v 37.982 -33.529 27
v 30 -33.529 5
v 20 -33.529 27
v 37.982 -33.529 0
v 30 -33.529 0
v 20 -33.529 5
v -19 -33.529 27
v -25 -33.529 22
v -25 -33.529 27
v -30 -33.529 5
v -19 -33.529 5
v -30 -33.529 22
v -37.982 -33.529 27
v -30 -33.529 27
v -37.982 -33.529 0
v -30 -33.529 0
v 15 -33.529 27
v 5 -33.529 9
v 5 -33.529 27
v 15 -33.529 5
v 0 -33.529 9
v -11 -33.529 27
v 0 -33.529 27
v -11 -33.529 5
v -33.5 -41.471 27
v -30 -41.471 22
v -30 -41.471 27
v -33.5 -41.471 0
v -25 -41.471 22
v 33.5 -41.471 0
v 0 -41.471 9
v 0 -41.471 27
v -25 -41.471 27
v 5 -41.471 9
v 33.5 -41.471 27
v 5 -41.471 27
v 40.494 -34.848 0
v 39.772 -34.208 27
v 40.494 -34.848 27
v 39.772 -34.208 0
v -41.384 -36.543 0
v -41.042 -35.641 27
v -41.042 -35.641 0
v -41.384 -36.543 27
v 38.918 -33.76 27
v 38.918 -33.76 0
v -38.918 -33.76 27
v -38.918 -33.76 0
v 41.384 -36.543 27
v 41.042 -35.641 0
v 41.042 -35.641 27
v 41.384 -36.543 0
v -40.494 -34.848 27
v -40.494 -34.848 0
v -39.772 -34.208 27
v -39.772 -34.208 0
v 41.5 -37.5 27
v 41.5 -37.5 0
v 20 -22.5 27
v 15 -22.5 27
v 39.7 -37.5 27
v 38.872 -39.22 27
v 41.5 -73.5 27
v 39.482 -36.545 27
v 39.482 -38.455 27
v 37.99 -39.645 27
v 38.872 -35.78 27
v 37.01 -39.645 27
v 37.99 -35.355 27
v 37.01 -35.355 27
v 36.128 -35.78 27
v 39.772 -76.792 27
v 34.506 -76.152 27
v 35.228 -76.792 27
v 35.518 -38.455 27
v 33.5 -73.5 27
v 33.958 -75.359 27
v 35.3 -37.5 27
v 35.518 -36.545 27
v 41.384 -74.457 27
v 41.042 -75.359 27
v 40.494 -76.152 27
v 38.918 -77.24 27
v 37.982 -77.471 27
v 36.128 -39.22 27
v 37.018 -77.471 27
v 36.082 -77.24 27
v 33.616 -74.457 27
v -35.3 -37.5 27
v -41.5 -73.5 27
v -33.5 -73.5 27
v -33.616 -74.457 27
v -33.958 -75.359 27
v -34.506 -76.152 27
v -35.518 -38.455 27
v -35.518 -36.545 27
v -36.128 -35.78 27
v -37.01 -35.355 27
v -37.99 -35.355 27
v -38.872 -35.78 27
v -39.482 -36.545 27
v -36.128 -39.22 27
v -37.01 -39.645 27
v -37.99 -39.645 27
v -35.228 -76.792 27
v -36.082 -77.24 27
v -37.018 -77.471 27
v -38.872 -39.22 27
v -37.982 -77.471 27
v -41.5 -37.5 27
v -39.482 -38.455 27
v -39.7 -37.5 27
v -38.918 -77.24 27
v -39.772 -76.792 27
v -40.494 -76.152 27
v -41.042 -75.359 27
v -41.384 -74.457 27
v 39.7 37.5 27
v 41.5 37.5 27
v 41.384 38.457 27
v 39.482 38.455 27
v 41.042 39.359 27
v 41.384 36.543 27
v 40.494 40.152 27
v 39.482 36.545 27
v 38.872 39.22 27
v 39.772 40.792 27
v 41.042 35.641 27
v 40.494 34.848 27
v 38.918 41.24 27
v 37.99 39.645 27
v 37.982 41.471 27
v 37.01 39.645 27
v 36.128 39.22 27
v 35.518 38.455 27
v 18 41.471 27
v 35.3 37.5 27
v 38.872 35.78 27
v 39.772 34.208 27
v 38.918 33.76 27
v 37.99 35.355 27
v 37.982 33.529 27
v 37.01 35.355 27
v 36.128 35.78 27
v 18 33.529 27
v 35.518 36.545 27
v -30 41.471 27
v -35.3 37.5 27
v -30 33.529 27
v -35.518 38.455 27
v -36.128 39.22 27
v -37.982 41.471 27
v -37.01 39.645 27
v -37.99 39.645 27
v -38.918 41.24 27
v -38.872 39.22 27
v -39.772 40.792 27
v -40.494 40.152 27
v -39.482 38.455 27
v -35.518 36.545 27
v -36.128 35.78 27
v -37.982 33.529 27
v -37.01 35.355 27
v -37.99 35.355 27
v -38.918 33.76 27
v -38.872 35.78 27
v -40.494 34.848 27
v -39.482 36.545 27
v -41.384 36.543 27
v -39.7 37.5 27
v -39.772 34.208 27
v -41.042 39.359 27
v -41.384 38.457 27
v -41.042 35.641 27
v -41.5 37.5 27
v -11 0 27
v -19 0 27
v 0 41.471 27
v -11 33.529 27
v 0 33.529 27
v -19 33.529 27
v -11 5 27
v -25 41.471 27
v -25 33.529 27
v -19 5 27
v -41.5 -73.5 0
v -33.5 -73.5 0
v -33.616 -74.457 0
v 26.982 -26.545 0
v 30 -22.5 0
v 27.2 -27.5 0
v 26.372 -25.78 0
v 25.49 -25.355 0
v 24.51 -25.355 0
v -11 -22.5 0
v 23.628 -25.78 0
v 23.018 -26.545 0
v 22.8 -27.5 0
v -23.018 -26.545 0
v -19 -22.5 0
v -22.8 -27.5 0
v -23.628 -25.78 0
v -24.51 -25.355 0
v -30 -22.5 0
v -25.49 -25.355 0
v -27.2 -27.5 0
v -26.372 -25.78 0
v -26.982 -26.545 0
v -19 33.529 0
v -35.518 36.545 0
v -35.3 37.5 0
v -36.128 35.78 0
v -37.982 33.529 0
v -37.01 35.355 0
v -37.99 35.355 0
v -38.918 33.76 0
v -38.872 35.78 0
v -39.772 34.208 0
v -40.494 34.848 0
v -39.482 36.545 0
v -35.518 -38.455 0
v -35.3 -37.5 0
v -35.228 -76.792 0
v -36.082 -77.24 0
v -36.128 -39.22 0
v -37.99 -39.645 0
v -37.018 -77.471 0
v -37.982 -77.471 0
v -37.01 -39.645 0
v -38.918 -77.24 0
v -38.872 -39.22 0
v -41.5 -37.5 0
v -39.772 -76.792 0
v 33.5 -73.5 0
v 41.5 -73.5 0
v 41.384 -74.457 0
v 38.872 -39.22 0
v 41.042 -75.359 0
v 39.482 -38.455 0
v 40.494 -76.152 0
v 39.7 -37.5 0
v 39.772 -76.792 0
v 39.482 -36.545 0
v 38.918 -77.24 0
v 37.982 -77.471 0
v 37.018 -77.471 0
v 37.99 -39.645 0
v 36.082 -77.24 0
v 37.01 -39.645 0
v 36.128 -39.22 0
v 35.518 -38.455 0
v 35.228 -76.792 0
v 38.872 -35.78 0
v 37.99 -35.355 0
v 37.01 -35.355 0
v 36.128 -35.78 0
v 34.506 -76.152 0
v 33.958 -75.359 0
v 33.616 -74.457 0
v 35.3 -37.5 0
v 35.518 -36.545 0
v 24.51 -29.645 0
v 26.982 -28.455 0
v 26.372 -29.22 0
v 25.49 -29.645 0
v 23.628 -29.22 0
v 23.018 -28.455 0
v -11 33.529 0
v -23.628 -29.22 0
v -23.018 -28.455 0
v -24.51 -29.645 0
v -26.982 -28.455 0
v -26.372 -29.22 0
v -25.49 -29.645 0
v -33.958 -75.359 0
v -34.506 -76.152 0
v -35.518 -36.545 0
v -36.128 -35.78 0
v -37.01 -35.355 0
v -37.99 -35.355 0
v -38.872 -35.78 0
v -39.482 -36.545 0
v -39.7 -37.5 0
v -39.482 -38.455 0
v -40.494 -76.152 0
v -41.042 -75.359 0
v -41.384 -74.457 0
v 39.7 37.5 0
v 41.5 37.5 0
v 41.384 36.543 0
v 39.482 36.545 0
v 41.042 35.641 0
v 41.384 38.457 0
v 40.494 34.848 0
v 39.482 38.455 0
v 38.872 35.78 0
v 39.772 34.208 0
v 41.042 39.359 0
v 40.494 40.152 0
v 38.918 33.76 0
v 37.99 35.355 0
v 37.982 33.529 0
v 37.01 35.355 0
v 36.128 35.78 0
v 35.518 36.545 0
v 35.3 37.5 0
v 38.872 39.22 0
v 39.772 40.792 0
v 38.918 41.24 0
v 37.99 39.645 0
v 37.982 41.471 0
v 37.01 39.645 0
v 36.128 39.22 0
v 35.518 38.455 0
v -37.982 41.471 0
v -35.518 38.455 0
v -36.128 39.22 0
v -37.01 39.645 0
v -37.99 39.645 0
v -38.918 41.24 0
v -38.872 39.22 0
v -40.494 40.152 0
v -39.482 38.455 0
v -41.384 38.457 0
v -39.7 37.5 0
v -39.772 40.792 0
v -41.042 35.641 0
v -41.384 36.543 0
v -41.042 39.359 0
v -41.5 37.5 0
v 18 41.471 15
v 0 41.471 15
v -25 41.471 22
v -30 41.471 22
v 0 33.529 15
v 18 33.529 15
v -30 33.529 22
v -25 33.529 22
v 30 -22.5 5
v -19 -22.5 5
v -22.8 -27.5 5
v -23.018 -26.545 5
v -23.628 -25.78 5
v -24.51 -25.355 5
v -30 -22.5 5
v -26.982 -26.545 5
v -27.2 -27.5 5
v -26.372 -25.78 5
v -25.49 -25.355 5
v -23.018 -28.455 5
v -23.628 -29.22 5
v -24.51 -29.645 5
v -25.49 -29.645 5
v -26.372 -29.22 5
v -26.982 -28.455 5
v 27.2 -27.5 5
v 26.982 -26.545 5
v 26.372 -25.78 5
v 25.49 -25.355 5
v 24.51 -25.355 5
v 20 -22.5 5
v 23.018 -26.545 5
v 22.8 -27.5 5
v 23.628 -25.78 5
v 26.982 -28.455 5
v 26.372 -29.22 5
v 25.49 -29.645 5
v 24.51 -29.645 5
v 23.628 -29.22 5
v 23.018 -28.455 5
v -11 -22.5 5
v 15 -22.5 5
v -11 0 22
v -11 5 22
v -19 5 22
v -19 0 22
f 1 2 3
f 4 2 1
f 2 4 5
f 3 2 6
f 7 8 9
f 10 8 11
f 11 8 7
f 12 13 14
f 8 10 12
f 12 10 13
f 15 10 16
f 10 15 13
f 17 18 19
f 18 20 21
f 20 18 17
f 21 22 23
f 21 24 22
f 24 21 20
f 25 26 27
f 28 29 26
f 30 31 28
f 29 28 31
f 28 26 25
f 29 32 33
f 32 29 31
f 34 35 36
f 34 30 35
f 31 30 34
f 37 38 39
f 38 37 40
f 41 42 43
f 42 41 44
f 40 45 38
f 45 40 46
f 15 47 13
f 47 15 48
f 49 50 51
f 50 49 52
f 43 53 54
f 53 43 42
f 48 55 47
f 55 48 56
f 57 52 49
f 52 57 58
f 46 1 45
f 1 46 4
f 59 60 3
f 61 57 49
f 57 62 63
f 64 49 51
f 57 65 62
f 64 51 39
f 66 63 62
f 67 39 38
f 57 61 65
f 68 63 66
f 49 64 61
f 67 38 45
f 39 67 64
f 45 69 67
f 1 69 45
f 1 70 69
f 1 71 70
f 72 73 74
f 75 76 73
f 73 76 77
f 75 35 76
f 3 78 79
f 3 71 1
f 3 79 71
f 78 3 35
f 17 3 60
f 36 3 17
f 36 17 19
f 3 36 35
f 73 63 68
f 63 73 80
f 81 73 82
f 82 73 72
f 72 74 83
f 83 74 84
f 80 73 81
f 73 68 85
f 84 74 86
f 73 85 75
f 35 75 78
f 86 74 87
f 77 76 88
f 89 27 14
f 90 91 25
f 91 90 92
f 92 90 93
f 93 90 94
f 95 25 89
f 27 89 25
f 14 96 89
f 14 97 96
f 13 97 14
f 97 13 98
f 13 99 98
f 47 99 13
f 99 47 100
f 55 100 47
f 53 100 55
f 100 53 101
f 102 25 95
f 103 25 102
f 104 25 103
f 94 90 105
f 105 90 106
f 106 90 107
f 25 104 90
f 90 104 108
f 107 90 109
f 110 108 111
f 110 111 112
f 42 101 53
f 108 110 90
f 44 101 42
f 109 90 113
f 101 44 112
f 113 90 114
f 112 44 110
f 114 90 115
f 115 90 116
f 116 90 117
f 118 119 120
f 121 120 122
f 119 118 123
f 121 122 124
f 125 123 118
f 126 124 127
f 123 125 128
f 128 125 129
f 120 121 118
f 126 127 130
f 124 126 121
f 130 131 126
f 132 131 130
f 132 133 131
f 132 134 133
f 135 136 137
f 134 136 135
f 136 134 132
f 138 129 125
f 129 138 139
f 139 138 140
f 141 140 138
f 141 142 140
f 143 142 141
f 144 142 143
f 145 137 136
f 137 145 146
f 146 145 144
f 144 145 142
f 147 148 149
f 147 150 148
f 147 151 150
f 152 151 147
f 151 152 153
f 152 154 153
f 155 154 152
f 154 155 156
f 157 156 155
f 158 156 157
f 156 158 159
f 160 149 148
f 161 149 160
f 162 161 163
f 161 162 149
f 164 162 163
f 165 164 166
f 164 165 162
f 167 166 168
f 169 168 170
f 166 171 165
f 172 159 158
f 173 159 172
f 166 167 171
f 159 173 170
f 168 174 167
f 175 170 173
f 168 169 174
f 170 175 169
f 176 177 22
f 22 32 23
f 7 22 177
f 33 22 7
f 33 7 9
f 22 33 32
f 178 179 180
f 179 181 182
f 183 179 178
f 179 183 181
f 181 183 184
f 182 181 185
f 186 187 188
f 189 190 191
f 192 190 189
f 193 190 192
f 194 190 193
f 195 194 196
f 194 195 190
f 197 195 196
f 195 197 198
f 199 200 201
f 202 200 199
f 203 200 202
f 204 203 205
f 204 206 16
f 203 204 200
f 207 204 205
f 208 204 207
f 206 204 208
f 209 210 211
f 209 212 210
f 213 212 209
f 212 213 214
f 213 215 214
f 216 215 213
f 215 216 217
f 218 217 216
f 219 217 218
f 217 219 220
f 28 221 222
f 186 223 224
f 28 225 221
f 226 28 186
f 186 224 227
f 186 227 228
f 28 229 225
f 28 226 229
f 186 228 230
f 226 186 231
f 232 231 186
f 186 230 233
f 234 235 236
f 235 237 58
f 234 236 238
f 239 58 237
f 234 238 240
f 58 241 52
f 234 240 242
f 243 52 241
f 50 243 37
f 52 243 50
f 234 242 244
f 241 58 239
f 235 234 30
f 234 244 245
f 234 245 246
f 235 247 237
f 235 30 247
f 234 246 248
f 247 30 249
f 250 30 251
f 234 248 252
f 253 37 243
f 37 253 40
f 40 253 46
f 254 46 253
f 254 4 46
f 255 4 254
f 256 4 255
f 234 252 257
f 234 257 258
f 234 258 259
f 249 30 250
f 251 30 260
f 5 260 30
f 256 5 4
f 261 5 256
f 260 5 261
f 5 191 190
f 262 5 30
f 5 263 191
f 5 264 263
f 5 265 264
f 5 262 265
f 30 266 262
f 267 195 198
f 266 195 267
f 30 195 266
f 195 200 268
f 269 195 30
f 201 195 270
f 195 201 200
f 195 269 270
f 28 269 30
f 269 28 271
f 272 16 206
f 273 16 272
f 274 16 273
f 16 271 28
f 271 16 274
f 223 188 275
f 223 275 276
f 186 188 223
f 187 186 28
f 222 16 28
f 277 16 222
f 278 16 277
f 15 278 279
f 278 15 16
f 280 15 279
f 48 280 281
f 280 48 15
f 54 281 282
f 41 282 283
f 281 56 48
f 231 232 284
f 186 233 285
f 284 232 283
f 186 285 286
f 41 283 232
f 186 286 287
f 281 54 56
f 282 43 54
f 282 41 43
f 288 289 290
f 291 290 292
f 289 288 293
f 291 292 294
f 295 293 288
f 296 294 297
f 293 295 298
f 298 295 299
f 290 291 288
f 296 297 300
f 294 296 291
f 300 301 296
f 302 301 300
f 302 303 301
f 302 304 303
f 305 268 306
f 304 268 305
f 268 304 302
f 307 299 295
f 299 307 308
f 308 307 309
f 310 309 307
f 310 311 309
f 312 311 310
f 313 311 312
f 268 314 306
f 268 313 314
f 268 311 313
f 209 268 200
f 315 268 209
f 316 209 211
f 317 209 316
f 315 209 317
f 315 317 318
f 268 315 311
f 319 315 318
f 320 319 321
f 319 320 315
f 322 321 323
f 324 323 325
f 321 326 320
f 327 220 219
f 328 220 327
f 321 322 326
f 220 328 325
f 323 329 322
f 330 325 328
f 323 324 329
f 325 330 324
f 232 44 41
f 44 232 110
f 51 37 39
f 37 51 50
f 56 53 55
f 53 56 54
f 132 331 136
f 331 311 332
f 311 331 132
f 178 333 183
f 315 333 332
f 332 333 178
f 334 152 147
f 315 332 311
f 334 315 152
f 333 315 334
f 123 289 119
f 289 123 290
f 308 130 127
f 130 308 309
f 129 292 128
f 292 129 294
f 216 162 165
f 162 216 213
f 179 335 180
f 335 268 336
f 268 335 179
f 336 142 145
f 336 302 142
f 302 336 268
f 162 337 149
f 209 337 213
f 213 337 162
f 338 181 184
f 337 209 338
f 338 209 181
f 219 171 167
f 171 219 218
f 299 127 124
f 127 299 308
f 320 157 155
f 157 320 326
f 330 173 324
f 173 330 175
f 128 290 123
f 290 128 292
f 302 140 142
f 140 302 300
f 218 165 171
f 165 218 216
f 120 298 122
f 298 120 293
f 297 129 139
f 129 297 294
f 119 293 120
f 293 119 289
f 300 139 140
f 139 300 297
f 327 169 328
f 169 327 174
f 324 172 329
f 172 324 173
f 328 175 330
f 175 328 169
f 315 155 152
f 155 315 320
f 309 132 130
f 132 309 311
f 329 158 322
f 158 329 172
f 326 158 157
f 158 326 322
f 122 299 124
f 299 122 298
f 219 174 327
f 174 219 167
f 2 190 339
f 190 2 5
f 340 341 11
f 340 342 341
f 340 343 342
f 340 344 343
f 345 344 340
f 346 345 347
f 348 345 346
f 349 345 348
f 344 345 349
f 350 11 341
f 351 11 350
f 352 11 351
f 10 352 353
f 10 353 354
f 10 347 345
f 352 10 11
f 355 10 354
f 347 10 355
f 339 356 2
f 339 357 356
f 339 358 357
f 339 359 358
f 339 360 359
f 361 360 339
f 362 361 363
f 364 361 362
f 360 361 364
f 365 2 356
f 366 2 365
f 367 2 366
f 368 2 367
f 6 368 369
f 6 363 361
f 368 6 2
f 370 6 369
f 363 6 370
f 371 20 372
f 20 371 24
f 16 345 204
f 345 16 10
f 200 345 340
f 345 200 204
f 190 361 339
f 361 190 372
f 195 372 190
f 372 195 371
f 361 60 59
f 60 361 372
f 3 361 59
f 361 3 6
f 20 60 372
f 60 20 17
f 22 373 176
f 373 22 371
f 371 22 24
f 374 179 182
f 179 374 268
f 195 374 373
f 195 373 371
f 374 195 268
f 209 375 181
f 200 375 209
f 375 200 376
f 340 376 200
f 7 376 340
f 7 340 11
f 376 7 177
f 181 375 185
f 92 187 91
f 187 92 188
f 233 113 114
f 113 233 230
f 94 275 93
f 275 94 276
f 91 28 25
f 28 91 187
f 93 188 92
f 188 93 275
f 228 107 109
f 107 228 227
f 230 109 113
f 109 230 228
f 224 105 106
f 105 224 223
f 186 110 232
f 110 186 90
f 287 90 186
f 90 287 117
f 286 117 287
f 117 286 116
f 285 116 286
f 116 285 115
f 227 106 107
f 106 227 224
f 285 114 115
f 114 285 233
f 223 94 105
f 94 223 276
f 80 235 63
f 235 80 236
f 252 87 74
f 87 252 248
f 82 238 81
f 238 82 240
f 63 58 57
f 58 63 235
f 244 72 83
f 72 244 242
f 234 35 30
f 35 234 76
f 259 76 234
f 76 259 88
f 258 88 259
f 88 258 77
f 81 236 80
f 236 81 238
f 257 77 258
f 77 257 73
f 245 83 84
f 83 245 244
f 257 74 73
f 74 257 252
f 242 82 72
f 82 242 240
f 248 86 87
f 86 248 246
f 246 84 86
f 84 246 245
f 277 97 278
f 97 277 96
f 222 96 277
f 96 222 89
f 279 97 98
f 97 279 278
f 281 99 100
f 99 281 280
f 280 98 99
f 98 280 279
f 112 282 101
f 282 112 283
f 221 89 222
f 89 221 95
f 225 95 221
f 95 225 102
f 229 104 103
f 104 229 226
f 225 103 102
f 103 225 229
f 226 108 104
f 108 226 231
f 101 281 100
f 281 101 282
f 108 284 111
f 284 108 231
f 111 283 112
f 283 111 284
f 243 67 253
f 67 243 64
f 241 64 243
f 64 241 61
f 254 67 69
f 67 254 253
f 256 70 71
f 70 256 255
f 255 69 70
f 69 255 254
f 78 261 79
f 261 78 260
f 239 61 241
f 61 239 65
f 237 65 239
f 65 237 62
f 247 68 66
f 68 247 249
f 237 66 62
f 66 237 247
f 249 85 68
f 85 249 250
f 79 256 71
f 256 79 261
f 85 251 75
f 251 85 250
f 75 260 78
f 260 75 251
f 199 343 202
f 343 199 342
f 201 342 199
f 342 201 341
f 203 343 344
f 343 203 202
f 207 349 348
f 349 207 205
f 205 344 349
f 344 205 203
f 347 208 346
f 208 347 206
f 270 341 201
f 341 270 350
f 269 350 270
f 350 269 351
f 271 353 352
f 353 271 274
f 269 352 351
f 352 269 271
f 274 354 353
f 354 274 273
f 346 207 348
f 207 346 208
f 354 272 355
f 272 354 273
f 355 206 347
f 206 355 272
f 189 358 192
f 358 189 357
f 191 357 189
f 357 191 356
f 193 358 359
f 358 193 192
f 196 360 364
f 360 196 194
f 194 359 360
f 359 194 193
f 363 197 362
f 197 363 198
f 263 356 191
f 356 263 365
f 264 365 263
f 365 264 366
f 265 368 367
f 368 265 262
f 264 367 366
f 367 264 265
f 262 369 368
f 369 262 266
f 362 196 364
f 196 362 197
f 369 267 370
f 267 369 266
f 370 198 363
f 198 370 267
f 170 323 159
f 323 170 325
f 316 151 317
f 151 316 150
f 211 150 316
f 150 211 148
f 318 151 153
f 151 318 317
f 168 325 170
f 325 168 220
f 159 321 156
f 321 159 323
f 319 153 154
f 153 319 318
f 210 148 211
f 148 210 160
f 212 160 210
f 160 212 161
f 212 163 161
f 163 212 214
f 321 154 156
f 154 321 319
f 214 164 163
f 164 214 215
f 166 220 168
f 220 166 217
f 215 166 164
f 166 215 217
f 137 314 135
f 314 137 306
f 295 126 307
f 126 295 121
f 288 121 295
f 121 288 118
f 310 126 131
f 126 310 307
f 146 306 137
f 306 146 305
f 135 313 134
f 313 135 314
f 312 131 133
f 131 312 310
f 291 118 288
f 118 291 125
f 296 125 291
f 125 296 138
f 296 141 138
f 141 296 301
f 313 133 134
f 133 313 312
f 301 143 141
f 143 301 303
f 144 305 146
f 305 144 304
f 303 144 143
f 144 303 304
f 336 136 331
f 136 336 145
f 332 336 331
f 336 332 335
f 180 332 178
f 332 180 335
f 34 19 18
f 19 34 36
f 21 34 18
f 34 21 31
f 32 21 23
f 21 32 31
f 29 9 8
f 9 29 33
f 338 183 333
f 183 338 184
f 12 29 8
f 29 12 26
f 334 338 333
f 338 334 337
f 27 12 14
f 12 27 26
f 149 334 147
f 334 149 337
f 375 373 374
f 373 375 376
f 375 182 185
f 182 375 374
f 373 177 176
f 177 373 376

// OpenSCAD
use <config.scad>

$fs=$fs/2;
$fa=$fa/2;

h=27;
l=75;
lg=75;
lg2=50;
r2 = 4;
r_vis = 2.2;

l2=40;


difference(){
    union (){
        hull(){
            translate([-lg/2,-l/2, 0]) cylinder(r=r2, h=h);
            translate([lg/2,-l/2, 0]) cylinder(r=r2, h=h);
        }

        hull(){
            translate([-lg/2,l/2, 0]) cylinder(r=r2, h=h);
            translate([lg/2,l/2, 0]) cylinder(r=r2, h=h);
        }
        
        translate([-lg2/2-5,-l/2, 0]) cube([lg2+10, 15, 5]);
        translate([15,-l/2, 0]) cube([5, 15, h]);
        
        
        hull(){
            translate([-15,-l/2, 0]) cylinder(r=r2, h=h);
            translate([-15,l/2, 0]) cylinder(r=r2, h=h);
        }
        
        hull(){
            translate([-lg/2,-l/2, 0]) cylinder(r=r2, h=h);
            translate([-lg/2,-l/2-l2+r2, 0]) cylinder(r=r2, h=h);
        }
        hull(){
            translate([ lg/2,-l/2, 0]) cylinder(r=r2, h=h);
            translate([ lg/2,-l/2-l2+r2, 0]) cylinder(r=r2, h=h);
        }
    }
    translate([-lg/2,-l/2, -1]) cylinder(r=r_vis, h=h+2);
    translate([ lg/2,-l/2, -1]) cylinder(r=r_vis, h=h+2);
    translate([-lg2/2,-l/2+10, -1]) cylinder(r=r_vis, h=h+2);
    translate([ lg2/2,-l/2+10, -1]) cylinder(r=r_vis, h=h+2);
    
    translate([-lg/2, l/2, -1]) cylinder(r=r_vis, h=h+2);
    translate([ lg/2, l/2, -1]) cylinder(r=r_vis, h=h+2);
    
    translate([ 0, l/4, h-12]) cube([18,50,13]);
    
    translate([ 0, -l, h-18]) cube([5,55,20]);
    
    translate([ -30, -50, h-5]) cube([5,100,6]);
    
    translate([ -30, 0, h-5]) cube([100,5,6]);
}
